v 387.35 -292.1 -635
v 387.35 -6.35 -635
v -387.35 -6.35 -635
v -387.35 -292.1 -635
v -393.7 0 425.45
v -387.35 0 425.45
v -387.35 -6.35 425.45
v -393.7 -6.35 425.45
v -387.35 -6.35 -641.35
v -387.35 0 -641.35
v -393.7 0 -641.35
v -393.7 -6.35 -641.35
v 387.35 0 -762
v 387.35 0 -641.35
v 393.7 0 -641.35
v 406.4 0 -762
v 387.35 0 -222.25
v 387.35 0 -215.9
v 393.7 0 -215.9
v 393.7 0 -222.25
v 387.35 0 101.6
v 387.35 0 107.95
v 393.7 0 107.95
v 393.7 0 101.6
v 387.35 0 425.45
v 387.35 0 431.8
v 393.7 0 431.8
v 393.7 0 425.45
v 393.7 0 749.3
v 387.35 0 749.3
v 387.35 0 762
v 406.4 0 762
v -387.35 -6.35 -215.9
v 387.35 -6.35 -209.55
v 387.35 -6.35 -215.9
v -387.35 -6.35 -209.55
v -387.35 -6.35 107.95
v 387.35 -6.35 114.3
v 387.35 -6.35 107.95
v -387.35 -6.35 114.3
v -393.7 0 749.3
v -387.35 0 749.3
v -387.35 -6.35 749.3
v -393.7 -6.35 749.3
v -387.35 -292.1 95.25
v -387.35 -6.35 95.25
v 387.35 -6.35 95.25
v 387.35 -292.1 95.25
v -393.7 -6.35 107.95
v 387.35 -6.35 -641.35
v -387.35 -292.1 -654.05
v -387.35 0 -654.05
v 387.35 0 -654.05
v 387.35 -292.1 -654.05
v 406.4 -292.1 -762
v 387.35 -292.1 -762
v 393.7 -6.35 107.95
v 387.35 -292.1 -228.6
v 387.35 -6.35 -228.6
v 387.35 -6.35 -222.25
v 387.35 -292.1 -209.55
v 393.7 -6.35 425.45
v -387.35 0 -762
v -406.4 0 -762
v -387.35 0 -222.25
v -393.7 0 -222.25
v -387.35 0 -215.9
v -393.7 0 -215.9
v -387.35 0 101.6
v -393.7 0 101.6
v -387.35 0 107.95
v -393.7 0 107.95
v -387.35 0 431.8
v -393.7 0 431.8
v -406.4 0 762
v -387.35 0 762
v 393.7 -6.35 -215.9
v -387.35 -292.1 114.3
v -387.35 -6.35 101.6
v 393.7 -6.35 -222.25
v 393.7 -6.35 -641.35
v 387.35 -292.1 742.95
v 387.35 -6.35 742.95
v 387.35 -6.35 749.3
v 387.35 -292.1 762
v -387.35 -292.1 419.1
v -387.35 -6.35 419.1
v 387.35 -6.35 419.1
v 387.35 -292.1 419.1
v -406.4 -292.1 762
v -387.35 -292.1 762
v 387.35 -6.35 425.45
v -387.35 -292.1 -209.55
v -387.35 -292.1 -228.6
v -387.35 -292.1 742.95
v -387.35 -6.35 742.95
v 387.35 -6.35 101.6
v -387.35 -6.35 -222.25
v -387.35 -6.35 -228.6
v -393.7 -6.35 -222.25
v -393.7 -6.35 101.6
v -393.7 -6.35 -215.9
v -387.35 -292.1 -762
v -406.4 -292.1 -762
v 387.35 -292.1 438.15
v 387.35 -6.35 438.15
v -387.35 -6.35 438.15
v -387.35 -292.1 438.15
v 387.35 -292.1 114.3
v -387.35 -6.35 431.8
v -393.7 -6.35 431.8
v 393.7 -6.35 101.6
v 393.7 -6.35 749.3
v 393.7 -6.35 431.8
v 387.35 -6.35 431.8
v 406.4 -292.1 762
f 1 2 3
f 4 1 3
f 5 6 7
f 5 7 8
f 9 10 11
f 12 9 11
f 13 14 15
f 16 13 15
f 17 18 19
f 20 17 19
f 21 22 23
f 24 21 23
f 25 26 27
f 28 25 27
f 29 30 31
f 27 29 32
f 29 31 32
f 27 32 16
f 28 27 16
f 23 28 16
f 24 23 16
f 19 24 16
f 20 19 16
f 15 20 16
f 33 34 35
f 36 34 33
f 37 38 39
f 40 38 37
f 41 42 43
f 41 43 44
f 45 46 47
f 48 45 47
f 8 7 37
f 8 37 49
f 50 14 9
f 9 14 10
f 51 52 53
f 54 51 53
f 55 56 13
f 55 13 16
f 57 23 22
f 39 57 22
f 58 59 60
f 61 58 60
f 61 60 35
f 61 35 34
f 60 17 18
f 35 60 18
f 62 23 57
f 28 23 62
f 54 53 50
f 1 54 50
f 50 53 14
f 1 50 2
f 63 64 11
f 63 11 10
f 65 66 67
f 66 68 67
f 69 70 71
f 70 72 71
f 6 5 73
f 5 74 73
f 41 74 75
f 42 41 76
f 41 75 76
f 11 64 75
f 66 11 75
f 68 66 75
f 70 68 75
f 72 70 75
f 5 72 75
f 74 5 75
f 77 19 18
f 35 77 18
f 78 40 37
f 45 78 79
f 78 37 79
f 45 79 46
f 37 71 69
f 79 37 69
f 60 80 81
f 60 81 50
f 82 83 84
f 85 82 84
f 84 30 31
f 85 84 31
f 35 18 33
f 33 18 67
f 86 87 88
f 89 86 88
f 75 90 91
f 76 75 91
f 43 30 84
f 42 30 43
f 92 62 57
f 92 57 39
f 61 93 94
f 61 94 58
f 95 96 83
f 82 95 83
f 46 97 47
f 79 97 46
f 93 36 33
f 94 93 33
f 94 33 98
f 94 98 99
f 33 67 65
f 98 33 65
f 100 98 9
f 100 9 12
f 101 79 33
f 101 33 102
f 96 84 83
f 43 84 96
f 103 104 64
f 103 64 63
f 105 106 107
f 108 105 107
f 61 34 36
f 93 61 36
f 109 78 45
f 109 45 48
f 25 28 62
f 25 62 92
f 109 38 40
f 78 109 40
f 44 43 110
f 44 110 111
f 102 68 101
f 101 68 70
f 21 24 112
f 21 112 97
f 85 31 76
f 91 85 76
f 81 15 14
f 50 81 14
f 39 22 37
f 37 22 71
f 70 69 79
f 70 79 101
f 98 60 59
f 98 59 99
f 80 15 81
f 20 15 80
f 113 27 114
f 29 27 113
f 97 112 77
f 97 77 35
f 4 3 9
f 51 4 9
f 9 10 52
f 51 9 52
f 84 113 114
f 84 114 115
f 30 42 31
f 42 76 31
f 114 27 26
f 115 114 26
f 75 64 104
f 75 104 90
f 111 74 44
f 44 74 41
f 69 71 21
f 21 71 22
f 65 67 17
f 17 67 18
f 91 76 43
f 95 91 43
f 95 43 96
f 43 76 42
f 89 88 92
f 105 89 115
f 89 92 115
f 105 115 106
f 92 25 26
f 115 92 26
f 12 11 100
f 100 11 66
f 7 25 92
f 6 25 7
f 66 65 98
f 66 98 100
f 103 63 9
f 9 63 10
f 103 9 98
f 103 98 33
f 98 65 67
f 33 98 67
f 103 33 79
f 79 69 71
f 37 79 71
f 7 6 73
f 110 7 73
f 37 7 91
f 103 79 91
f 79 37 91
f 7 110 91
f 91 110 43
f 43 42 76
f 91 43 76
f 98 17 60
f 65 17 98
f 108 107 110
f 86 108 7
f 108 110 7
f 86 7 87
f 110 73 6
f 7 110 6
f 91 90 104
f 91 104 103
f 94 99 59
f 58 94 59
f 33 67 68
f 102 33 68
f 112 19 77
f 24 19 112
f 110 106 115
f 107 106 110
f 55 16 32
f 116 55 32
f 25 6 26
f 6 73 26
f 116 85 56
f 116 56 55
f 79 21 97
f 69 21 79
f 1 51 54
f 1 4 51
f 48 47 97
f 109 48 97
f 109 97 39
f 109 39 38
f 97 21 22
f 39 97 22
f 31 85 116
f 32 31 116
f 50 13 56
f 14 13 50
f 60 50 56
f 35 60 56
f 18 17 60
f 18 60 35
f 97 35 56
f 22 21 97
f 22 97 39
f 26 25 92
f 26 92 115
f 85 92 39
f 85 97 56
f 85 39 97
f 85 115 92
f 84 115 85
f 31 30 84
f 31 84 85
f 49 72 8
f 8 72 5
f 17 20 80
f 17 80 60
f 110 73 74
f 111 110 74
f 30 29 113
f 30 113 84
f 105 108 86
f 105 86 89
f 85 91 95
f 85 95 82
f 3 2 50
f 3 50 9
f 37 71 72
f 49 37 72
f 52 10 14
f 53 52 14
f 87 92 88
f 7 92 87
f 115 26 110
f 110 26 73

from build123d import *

# Parameters (mm, degrees)
F1_DEPTH = 292.1
F2_W     = 19.05
F2_H     = 1524
F3_DEPTH = 292.1
F4_W     = 787.4
F4_H     = 317.5
F4_W_2   = 774.7
F4_H_2   = 304.8
F4_H_3   = 419.1
F4_H_4   = 406.4
F5_DEPTH = 6.35


with BuildPart() as f1:
    # F0 (on Front) → F1 (new body)
    with BuildSketch(Plane.XZ):
        Polygon((387.35, 742.95), (387.35, 762), (-387.35, 762), (-387.35, 742.95), (0, 742.95), align=None)
        Polygon((387.35, 419.1), (387.35, 438.15), (0, 438.15), (-387.35, 438.15), (-387.35, 419.1), (0, 419.1), align=None)
        Polygon((0, 95.25), (387.35, 95.25), (387.35, 114.3), (0, 114.3), (-387.35, 114.3), (-387.35, 95.25), align=None)
        Polygon((0, -228.6), (387.35, -228.6), (387.35, -209.55), (0, -209.55), (-387.35, -209.55), (-387.35, -228.6), align=None)
        Polygon((-387.35, -654.05), (387.35, -654.05), (387.35, -635), (0, -635), (-387.35, -635), align=None)
    extrude(amount=F1_DEPTH)


with BuildPart() as f3:
    # F2 (on Front) → F3 (new body)
    with BuildSketch(Plane.XZ):
        with Locations((-396.875, 0)):
            Rectangle(F2_W, F2_H)
        with Locations((396.875, 0)):
            Rectangle(F2_W, F2_H)
    extrude(amount=F3_DEPTH)


with BuildPart() as f5_tool:
    # F4 (on face) → F5 (new body)
    with BuildSketch(Plane(origin=(0, 0, 0), x_dir=(-1, 0, 0), z_dir=(0, 1, 0))):
        with Locations((0, 590.55)):
            Rectangle(F4_W, F4_H)
        with Locations((0, 590.55)):
            Rectangle(F4_W_2, F4_H_2, mode=Mode.SUBTRACT)
        with Locations((0, 266.7)):
            Rectangle(F4_W, F4_H)
        with Locations((0, 266.7)):
            Rectangle(F4_W_2, F4_H_2, mode=Mode.SUBTRACT)
        with Locations((0, -57.15)):
            Rectangle(F4_W, F4_H)
        with Locations((0, -57.15)):
            Rectangle(F4_W_2, F4_H_2, mode=Mode.SUBTRACT)
        with Locations((0, -431.8)):
            Rectangle(F4_W, F4_H_3)
        with Locations((0, -431.8)):
            Rectangle(F4_W_2, F4_H_4, mode=Mode.SUBTRACT)
    extrude(amount=-F5_DEPTH)


with BuildPart() as f1_1:
    add(f1.part)

    # F5: cut by f5_tool
    add(f5_tool.part, mode=Mode.SUBTRACT)


with BuildPart() as f3_1:
    add(f3.part)

    # F5: cut by f5_tool
    add(f5_tool.part, mode=Mode.SUBTRACT)


solid = Compound([f1_1.part, f3_1.part])
